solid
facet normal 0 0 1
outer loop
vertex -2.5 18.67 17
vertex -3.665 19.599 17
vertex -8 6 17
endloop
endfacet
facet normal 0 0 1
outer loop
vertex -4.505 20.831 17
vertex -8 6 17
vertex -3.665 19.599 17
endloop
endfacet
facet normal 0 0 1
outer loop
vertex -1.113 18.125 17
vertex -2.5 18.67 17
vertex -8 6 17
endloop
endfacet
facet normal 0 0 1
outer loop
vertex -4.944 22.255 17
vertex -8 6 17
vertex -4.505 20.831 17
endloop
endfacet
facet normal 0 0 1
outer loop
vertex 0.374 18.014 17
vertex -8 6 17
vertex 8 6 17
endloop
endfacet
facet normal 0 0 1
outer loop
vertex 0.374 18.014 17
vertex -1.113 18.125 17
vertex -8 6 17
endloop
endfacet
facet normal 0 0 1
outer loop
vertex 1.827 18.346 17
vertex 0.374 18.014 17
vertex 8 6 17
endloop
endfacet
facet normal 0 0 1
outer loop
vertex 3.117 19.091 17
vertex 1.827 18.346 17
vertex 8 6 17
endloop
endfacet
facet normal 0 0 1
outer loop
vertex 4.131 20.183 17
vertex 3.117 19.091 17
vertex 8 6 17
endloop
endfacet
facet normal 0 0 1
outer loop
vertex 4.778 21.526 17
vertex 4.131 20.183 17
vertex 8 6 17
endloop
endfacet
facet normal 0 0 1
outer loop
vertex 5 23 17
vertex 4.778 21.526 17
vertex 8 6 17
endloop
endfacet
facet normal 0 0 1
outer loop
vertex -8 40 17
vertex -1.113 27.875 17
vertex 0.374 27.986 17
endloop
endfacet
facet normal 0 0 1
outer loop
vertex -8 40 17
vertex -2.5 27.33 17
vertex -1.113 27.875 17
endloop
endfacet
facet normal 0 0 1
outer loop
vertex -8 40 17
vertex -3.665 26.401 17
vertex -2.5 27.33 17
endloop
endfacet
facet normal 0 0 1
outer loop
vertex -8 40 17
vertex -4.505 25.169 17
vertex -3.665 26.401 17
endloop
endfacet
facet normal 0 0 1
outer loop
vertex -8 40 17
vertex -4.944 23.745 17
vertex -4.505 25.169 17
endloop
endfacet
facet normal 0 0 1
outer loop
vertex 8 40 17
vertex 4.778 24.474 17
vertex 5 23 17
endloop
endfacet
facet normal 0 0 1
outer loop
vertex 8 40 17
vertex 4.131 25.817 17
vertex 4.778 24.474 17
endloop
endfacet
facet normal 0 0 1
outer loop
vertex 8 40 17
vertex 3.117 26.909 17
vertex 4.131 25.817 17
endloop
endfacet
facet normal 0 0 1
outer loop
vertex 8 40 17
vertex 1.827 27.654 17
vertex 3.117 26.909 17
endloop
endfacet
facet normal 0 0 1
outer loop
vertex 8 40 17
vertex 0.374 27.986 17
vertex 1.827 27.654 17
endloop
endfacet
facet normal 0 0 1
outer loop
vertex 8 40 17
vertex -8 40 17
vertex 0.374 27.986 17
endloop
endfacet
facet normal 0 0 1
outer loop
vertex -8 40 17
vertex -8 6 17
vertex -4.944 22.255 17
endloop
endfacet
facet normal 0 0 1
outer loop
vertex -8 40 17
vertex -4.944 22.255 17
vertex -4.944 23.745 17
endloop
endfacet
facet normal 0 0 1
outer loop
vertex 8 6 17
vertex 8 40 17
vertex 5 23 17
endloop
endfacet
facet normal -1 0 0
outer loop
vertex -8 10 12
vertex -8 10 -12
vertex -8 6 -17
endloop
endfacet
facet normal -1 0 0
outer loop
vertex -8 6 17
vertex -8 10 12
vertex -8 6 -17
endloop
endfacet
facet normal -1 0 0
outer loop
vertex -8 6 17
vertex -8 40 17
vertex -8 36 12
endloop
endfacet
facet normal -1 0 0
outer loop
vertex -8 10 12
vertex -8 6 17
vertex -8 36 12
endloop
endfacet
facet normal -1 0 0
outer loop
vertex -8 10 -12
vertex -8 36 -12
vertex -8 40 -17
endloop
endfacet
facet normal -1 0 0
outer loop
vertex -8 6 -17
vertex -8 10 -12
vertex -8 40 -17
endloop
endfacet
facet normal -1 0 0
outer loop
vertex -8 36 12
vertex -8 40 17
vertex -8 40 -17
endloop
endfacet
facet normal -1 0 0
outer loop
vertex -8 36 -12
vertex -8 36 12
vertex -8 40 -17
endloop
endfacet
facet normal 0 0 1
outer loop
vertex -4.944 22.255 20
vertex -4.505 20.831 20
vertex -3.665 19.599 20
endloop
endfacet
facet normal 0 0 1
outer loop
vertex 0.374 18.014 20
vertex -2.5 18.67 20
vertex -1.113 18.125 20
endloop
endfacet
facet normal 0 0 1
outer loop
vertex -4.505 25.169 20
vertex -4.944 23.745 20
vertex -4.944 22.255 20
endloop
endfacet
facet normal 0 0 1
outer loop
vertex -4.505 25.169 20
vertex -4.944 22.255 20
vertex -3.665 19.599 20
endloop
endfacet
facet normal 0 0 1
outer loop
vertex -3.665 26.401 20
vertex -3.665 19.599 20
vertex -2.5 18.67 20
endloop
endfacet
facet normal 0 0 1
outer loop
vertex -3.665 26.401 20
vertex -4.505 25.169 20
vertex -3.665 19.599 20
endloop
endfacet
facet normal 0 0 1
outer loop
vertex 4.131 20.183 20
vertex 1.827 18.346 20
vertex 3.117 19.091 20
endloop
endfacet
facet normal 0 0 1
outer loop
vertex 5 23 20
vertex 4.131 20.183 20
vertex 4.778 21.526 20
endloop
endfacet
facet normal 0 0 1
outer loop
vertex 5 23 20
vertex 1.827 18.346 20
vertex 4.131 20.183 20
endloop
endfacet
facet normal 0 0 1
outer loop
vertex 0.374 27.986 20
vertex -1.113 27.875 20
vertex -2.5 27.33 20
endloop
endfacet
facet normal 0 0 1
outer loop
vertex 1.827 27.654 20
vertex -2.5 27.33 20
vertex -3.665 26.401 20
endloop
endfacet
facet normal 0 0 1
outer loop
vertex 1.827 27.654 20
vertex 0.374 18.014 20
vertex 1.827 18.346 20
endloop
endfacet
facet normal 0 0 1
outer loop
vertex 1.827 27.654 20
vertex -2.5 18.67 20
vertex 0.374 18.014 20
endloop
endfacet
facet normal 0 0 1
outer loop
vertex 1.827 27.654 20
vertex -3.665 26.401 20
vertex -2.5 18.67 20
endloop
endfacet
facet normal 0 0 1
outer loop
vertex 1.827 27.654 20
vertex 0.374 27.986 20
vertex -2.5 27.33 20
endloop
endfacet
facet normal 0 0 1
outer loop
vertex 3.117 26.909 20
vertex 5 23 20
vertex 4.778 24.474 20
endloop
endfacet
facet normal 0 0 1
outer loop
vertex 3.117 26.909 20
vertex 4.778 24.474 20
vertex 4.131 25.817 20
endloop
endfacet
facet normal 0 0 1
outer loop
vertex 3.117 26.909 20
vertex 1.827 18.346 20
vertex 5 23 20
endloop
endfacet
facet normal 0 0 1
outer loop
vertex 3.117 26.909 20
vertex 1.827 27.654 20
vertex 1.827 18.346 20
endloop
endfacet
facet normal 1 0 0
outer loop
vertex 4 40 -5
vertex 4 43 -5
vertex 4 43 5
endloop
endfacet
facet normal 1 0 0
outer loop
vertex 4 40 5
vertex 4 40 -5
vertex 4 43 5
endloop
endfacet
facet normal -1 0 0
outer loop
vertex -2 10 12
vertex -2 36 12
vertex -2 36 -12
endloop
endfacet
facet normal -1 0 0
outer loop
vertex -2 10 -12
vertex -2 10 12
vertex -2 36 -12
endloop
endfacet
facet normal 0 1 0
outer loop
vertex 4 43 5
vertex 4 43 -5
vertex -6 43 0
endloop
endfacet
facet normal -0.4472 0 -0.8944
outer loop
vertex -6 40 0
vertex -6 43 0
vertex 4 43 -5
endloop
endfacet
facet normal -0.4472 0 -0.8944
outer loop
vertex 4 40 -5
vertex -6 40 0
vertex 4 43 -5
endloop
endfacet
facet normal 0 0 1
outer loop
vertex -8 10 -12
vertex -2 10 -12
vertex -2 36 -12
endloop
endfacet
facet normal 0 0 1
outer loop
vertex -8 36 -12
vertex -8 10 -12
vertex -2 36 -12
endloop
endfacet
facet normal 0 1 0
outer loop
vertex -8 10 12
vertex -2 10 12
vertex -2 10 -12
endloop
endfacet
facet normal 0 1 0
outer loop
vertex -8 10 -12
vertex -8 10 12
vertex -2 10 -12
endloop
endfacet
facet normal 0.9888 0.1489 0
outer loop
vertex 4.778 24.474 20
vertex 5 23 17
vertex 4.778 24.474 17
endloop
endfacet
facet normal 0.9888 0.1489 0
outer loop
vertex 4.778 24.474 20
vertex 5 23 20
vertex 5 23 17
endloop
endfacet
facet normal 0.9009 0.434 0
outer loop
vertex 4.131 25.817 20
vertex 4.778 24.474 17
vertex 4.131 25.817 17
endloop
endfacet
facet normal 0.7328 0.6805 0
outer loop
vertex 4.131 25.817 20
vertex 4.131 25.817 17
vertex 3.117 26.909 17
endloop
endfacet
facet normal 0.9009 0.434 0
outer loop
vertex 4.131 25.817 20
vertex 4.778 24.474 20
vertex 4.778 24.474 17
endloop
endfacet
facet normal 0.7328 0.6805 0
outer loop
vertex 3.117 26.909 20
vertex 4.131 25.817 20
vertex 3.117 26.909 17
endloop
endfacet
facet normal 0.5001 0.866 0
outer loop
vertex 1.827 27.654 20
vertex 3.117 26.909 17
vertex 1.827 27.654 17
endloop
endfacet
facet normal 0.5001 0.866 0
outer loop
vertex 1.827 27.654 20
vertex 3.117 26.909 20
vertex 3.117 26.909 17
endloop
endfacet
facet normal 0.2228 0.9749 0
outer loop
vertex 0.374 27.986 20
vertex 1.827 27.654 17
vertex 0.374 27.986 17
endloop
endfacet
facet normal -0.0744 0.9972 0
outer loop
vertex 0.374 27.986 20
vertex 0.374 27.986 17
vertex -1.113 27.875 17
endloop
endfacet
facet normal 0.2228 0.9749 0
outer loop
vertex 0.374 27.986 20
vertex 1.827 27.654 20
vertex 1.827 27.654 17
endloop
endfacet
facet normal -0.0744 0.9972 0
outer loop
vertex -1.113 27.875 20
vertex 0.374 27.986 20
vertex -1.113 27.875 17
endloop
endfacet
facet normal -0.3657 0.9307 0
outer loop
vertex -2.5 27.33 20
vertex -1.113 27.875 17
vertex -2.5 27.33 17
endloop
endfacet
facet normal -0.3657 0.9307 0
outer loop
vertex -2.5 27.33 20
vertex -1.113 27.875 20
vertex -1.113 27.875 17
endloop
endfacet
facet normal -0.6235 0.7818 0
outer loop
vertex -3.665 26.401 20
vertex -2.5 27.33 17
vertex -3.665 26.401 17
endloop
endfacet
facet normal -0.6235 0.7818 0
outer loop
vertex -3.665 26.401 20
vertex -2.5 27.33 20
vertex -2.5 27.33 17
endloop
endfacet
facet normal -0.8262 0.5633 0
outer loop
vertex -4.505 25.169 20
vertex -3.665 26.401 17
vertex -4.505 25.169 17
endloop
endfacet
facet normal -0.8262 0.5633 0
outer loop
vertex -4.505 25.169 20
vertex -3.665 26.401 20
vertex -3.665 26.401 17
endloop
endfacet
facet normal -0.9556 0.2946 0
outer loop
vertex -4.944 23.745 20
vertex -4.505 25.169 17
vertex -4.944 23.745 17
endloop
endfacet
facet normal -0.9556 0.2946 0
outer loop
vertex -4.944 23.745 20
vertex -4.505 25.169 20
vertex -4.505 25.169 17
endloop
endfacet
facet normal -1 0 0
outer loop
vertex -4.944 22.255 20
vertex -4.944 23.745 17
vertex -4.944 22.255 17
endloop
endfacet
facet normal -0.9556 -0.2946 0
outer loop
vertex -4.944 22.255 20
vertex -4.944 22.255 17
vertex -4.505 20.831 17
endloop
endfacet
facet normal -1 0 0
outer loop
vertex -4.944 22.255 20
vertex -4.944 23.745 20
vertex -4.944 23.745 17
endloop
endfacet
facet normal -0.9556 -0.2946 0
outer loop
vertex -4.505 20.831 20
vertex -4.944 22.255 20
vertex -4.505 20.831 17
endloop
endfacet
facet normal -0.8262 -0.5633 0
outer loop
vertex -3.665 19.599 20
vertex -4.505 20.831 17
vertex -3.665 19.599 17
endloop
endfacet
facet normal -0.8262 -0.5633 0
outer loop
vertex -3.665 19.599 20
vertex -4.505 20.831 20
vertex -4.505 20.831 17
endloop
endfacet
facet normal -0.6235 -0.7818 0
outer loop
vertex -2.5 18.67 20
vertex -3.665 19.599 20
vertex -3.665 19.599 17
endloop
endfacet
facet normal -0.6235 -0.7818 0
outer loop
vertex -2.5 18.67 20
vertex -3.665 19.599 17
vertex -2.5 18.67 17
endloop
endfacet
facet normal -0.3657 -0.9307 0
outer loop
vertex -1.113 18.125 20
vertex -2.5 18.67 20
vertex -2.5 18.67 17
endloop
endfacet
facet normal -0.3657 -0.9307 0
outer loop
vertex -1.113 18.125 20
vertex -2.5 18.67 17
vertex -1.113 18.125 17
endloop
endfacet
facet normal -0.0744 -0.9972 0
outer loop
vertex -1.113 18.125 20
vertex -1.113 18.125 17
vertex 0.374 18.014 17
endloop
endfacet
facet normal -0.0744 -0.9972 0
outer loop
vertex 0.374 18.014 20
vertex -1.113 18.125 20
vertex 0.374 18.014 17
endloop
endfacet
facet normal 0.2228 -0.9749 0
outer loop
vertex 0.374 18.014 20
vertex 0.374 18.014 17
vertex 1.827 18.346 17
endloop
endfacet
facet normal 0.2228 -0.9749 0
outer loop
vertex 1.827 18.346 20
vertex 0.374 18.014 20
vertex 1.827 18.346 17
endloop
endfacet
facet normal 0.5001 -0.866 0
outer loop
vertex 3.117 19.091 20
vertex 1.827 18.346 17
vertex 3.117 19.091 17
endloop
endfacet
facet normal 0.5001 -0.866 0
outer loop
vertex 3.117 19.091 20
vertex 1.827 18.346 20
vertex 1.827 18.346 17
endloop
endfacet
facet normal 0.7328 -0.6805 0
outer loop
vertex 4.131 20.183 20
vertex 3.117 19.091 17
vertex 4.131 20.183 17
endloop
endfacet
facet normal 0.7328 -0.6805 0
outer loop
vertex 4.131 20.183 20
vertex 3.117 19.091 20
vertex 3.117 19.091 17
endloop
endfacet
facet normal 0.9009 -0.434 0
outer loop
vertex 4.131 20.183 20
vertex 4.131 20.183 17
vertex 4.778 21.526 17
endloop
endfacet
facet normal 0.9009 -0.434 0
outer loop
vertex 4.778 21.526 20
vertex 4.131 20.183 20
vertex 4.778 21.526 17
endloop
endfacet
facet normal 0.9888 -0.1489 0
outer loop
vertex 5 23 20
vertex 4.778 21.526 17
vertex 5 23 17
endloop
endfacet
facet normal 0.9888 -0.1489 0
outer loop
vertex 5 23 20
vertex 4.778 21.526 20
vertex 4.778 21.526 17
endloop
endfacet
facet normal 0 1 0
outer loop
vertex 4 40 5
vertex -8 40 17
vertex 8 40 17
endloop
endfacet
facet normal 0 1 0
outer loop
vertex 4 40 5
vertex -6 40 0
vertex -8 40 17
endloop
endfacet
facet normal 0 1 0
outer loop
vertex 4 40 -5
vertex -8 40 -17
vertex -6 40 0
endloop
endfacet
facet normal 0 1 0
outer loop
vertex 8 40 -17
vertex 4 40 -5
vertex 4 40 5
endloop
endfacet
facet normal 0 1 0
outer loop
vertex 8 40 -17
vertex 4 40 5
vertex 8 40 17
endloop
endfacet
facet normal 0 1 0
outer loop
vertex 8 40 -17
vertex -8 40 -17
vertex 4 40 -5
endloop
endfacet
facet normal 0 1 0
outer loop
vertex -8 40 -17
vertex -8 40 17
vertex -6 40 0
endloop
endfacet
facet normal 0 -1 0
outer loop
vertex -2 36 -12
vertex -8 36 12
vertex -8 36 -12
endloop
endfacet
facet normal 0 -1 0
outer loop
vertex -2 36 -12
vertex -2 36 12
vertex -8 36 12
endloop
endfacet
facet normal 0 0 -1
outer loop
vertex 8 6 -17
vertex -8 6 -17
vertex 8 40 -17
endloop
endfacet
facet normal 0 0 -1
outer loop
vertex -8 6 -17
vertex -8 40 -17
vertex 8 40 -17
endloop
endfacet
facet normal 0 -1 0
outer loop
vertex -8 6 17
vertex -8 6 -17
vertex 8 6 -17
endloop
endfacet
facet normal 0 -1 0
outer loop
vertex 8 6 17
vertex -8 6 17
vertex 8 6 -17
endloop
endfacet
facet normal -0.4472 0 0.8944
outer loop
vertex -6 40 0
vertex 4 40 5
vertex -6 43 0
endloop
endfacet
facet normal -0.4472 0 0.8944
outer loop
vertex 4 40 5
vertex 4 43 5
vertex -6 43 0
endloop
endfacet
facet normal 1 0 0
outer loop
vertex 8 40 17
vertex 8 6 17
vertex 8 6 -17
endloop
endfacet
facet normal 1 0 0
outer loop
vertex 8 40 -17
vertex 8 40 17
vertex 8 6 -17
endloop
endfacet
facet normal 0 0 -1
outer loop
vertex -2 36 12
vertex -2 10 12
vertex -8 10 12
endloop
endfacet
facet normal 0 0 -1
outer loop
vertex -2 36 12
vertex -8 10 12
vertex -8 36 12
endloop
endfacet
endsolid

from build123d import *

# Parameters (mm, degrees)
SKETCH1_W           = 16
SKETCH1_H           = 34
BOSS_EXTRUDE1_DEPTH = 17
SKETCH2_W           = 24
SKETCH2_H           = 26
CUT_EXTRUDE1_DEPTH  = 3
SKETCH3_R           = 5
BOSS_EXTRUDE2_DEPTH = 1.5
BOSS_EXTRUDE3_DEPTH = 1.5


with BuildPart() as part:
    # Sketch1 → Boss-Extrude1 (new, symmetric)
    with BuildSketch(Plane(origin=(0, 23, 0), x_dir=(1, 0, 0), z_dir=(0, 1, 0))):
        Rectangle(SKETCH1_W, SKETCH1_H)
    extrude(amount=BOSS_EXTRUDE1_DEPTH, both=True)

    # Sketch2 → Cut-Extrude1 (cut, symmetric)
    with BuildSketch(Plane(origin=(-5, 0, 0), x_dir=(0, 0, -1), z_dir=(1, 0, 0))):
        with Locations((0, 23)):
            Rectangle(SKETCH2_W, SKETCH2_H)
    extrude(amount=CUT_EXTRUDE1_DEPTH, both=True, mode=Mode.SUBTRACT)

    # Sketch3 → Boss-Extrude2 (add, symmetric)
    with BuildSketch(Plane.XY.offset(18.5)):
        with Locations((0, 23)):
            Circle(SKETCH3_R)
    extrude(amount=BOSS_EXTRUDE2_DEPTH, both=True)

    # Sketch4 → Boss-Extrude3 (add, symmetric)
    with BuildSketch(Plane(origin=(0, 41.5, 0), x_dir=(1, 0, 0), z_dir=(0, 1, 0))):
        Polygon((4, 5), (4, -5), (-6, 0), align=None)
    extrude(amount=BOSS_EXTRUDE3_DEPTH, both=True)


solid = part.part
